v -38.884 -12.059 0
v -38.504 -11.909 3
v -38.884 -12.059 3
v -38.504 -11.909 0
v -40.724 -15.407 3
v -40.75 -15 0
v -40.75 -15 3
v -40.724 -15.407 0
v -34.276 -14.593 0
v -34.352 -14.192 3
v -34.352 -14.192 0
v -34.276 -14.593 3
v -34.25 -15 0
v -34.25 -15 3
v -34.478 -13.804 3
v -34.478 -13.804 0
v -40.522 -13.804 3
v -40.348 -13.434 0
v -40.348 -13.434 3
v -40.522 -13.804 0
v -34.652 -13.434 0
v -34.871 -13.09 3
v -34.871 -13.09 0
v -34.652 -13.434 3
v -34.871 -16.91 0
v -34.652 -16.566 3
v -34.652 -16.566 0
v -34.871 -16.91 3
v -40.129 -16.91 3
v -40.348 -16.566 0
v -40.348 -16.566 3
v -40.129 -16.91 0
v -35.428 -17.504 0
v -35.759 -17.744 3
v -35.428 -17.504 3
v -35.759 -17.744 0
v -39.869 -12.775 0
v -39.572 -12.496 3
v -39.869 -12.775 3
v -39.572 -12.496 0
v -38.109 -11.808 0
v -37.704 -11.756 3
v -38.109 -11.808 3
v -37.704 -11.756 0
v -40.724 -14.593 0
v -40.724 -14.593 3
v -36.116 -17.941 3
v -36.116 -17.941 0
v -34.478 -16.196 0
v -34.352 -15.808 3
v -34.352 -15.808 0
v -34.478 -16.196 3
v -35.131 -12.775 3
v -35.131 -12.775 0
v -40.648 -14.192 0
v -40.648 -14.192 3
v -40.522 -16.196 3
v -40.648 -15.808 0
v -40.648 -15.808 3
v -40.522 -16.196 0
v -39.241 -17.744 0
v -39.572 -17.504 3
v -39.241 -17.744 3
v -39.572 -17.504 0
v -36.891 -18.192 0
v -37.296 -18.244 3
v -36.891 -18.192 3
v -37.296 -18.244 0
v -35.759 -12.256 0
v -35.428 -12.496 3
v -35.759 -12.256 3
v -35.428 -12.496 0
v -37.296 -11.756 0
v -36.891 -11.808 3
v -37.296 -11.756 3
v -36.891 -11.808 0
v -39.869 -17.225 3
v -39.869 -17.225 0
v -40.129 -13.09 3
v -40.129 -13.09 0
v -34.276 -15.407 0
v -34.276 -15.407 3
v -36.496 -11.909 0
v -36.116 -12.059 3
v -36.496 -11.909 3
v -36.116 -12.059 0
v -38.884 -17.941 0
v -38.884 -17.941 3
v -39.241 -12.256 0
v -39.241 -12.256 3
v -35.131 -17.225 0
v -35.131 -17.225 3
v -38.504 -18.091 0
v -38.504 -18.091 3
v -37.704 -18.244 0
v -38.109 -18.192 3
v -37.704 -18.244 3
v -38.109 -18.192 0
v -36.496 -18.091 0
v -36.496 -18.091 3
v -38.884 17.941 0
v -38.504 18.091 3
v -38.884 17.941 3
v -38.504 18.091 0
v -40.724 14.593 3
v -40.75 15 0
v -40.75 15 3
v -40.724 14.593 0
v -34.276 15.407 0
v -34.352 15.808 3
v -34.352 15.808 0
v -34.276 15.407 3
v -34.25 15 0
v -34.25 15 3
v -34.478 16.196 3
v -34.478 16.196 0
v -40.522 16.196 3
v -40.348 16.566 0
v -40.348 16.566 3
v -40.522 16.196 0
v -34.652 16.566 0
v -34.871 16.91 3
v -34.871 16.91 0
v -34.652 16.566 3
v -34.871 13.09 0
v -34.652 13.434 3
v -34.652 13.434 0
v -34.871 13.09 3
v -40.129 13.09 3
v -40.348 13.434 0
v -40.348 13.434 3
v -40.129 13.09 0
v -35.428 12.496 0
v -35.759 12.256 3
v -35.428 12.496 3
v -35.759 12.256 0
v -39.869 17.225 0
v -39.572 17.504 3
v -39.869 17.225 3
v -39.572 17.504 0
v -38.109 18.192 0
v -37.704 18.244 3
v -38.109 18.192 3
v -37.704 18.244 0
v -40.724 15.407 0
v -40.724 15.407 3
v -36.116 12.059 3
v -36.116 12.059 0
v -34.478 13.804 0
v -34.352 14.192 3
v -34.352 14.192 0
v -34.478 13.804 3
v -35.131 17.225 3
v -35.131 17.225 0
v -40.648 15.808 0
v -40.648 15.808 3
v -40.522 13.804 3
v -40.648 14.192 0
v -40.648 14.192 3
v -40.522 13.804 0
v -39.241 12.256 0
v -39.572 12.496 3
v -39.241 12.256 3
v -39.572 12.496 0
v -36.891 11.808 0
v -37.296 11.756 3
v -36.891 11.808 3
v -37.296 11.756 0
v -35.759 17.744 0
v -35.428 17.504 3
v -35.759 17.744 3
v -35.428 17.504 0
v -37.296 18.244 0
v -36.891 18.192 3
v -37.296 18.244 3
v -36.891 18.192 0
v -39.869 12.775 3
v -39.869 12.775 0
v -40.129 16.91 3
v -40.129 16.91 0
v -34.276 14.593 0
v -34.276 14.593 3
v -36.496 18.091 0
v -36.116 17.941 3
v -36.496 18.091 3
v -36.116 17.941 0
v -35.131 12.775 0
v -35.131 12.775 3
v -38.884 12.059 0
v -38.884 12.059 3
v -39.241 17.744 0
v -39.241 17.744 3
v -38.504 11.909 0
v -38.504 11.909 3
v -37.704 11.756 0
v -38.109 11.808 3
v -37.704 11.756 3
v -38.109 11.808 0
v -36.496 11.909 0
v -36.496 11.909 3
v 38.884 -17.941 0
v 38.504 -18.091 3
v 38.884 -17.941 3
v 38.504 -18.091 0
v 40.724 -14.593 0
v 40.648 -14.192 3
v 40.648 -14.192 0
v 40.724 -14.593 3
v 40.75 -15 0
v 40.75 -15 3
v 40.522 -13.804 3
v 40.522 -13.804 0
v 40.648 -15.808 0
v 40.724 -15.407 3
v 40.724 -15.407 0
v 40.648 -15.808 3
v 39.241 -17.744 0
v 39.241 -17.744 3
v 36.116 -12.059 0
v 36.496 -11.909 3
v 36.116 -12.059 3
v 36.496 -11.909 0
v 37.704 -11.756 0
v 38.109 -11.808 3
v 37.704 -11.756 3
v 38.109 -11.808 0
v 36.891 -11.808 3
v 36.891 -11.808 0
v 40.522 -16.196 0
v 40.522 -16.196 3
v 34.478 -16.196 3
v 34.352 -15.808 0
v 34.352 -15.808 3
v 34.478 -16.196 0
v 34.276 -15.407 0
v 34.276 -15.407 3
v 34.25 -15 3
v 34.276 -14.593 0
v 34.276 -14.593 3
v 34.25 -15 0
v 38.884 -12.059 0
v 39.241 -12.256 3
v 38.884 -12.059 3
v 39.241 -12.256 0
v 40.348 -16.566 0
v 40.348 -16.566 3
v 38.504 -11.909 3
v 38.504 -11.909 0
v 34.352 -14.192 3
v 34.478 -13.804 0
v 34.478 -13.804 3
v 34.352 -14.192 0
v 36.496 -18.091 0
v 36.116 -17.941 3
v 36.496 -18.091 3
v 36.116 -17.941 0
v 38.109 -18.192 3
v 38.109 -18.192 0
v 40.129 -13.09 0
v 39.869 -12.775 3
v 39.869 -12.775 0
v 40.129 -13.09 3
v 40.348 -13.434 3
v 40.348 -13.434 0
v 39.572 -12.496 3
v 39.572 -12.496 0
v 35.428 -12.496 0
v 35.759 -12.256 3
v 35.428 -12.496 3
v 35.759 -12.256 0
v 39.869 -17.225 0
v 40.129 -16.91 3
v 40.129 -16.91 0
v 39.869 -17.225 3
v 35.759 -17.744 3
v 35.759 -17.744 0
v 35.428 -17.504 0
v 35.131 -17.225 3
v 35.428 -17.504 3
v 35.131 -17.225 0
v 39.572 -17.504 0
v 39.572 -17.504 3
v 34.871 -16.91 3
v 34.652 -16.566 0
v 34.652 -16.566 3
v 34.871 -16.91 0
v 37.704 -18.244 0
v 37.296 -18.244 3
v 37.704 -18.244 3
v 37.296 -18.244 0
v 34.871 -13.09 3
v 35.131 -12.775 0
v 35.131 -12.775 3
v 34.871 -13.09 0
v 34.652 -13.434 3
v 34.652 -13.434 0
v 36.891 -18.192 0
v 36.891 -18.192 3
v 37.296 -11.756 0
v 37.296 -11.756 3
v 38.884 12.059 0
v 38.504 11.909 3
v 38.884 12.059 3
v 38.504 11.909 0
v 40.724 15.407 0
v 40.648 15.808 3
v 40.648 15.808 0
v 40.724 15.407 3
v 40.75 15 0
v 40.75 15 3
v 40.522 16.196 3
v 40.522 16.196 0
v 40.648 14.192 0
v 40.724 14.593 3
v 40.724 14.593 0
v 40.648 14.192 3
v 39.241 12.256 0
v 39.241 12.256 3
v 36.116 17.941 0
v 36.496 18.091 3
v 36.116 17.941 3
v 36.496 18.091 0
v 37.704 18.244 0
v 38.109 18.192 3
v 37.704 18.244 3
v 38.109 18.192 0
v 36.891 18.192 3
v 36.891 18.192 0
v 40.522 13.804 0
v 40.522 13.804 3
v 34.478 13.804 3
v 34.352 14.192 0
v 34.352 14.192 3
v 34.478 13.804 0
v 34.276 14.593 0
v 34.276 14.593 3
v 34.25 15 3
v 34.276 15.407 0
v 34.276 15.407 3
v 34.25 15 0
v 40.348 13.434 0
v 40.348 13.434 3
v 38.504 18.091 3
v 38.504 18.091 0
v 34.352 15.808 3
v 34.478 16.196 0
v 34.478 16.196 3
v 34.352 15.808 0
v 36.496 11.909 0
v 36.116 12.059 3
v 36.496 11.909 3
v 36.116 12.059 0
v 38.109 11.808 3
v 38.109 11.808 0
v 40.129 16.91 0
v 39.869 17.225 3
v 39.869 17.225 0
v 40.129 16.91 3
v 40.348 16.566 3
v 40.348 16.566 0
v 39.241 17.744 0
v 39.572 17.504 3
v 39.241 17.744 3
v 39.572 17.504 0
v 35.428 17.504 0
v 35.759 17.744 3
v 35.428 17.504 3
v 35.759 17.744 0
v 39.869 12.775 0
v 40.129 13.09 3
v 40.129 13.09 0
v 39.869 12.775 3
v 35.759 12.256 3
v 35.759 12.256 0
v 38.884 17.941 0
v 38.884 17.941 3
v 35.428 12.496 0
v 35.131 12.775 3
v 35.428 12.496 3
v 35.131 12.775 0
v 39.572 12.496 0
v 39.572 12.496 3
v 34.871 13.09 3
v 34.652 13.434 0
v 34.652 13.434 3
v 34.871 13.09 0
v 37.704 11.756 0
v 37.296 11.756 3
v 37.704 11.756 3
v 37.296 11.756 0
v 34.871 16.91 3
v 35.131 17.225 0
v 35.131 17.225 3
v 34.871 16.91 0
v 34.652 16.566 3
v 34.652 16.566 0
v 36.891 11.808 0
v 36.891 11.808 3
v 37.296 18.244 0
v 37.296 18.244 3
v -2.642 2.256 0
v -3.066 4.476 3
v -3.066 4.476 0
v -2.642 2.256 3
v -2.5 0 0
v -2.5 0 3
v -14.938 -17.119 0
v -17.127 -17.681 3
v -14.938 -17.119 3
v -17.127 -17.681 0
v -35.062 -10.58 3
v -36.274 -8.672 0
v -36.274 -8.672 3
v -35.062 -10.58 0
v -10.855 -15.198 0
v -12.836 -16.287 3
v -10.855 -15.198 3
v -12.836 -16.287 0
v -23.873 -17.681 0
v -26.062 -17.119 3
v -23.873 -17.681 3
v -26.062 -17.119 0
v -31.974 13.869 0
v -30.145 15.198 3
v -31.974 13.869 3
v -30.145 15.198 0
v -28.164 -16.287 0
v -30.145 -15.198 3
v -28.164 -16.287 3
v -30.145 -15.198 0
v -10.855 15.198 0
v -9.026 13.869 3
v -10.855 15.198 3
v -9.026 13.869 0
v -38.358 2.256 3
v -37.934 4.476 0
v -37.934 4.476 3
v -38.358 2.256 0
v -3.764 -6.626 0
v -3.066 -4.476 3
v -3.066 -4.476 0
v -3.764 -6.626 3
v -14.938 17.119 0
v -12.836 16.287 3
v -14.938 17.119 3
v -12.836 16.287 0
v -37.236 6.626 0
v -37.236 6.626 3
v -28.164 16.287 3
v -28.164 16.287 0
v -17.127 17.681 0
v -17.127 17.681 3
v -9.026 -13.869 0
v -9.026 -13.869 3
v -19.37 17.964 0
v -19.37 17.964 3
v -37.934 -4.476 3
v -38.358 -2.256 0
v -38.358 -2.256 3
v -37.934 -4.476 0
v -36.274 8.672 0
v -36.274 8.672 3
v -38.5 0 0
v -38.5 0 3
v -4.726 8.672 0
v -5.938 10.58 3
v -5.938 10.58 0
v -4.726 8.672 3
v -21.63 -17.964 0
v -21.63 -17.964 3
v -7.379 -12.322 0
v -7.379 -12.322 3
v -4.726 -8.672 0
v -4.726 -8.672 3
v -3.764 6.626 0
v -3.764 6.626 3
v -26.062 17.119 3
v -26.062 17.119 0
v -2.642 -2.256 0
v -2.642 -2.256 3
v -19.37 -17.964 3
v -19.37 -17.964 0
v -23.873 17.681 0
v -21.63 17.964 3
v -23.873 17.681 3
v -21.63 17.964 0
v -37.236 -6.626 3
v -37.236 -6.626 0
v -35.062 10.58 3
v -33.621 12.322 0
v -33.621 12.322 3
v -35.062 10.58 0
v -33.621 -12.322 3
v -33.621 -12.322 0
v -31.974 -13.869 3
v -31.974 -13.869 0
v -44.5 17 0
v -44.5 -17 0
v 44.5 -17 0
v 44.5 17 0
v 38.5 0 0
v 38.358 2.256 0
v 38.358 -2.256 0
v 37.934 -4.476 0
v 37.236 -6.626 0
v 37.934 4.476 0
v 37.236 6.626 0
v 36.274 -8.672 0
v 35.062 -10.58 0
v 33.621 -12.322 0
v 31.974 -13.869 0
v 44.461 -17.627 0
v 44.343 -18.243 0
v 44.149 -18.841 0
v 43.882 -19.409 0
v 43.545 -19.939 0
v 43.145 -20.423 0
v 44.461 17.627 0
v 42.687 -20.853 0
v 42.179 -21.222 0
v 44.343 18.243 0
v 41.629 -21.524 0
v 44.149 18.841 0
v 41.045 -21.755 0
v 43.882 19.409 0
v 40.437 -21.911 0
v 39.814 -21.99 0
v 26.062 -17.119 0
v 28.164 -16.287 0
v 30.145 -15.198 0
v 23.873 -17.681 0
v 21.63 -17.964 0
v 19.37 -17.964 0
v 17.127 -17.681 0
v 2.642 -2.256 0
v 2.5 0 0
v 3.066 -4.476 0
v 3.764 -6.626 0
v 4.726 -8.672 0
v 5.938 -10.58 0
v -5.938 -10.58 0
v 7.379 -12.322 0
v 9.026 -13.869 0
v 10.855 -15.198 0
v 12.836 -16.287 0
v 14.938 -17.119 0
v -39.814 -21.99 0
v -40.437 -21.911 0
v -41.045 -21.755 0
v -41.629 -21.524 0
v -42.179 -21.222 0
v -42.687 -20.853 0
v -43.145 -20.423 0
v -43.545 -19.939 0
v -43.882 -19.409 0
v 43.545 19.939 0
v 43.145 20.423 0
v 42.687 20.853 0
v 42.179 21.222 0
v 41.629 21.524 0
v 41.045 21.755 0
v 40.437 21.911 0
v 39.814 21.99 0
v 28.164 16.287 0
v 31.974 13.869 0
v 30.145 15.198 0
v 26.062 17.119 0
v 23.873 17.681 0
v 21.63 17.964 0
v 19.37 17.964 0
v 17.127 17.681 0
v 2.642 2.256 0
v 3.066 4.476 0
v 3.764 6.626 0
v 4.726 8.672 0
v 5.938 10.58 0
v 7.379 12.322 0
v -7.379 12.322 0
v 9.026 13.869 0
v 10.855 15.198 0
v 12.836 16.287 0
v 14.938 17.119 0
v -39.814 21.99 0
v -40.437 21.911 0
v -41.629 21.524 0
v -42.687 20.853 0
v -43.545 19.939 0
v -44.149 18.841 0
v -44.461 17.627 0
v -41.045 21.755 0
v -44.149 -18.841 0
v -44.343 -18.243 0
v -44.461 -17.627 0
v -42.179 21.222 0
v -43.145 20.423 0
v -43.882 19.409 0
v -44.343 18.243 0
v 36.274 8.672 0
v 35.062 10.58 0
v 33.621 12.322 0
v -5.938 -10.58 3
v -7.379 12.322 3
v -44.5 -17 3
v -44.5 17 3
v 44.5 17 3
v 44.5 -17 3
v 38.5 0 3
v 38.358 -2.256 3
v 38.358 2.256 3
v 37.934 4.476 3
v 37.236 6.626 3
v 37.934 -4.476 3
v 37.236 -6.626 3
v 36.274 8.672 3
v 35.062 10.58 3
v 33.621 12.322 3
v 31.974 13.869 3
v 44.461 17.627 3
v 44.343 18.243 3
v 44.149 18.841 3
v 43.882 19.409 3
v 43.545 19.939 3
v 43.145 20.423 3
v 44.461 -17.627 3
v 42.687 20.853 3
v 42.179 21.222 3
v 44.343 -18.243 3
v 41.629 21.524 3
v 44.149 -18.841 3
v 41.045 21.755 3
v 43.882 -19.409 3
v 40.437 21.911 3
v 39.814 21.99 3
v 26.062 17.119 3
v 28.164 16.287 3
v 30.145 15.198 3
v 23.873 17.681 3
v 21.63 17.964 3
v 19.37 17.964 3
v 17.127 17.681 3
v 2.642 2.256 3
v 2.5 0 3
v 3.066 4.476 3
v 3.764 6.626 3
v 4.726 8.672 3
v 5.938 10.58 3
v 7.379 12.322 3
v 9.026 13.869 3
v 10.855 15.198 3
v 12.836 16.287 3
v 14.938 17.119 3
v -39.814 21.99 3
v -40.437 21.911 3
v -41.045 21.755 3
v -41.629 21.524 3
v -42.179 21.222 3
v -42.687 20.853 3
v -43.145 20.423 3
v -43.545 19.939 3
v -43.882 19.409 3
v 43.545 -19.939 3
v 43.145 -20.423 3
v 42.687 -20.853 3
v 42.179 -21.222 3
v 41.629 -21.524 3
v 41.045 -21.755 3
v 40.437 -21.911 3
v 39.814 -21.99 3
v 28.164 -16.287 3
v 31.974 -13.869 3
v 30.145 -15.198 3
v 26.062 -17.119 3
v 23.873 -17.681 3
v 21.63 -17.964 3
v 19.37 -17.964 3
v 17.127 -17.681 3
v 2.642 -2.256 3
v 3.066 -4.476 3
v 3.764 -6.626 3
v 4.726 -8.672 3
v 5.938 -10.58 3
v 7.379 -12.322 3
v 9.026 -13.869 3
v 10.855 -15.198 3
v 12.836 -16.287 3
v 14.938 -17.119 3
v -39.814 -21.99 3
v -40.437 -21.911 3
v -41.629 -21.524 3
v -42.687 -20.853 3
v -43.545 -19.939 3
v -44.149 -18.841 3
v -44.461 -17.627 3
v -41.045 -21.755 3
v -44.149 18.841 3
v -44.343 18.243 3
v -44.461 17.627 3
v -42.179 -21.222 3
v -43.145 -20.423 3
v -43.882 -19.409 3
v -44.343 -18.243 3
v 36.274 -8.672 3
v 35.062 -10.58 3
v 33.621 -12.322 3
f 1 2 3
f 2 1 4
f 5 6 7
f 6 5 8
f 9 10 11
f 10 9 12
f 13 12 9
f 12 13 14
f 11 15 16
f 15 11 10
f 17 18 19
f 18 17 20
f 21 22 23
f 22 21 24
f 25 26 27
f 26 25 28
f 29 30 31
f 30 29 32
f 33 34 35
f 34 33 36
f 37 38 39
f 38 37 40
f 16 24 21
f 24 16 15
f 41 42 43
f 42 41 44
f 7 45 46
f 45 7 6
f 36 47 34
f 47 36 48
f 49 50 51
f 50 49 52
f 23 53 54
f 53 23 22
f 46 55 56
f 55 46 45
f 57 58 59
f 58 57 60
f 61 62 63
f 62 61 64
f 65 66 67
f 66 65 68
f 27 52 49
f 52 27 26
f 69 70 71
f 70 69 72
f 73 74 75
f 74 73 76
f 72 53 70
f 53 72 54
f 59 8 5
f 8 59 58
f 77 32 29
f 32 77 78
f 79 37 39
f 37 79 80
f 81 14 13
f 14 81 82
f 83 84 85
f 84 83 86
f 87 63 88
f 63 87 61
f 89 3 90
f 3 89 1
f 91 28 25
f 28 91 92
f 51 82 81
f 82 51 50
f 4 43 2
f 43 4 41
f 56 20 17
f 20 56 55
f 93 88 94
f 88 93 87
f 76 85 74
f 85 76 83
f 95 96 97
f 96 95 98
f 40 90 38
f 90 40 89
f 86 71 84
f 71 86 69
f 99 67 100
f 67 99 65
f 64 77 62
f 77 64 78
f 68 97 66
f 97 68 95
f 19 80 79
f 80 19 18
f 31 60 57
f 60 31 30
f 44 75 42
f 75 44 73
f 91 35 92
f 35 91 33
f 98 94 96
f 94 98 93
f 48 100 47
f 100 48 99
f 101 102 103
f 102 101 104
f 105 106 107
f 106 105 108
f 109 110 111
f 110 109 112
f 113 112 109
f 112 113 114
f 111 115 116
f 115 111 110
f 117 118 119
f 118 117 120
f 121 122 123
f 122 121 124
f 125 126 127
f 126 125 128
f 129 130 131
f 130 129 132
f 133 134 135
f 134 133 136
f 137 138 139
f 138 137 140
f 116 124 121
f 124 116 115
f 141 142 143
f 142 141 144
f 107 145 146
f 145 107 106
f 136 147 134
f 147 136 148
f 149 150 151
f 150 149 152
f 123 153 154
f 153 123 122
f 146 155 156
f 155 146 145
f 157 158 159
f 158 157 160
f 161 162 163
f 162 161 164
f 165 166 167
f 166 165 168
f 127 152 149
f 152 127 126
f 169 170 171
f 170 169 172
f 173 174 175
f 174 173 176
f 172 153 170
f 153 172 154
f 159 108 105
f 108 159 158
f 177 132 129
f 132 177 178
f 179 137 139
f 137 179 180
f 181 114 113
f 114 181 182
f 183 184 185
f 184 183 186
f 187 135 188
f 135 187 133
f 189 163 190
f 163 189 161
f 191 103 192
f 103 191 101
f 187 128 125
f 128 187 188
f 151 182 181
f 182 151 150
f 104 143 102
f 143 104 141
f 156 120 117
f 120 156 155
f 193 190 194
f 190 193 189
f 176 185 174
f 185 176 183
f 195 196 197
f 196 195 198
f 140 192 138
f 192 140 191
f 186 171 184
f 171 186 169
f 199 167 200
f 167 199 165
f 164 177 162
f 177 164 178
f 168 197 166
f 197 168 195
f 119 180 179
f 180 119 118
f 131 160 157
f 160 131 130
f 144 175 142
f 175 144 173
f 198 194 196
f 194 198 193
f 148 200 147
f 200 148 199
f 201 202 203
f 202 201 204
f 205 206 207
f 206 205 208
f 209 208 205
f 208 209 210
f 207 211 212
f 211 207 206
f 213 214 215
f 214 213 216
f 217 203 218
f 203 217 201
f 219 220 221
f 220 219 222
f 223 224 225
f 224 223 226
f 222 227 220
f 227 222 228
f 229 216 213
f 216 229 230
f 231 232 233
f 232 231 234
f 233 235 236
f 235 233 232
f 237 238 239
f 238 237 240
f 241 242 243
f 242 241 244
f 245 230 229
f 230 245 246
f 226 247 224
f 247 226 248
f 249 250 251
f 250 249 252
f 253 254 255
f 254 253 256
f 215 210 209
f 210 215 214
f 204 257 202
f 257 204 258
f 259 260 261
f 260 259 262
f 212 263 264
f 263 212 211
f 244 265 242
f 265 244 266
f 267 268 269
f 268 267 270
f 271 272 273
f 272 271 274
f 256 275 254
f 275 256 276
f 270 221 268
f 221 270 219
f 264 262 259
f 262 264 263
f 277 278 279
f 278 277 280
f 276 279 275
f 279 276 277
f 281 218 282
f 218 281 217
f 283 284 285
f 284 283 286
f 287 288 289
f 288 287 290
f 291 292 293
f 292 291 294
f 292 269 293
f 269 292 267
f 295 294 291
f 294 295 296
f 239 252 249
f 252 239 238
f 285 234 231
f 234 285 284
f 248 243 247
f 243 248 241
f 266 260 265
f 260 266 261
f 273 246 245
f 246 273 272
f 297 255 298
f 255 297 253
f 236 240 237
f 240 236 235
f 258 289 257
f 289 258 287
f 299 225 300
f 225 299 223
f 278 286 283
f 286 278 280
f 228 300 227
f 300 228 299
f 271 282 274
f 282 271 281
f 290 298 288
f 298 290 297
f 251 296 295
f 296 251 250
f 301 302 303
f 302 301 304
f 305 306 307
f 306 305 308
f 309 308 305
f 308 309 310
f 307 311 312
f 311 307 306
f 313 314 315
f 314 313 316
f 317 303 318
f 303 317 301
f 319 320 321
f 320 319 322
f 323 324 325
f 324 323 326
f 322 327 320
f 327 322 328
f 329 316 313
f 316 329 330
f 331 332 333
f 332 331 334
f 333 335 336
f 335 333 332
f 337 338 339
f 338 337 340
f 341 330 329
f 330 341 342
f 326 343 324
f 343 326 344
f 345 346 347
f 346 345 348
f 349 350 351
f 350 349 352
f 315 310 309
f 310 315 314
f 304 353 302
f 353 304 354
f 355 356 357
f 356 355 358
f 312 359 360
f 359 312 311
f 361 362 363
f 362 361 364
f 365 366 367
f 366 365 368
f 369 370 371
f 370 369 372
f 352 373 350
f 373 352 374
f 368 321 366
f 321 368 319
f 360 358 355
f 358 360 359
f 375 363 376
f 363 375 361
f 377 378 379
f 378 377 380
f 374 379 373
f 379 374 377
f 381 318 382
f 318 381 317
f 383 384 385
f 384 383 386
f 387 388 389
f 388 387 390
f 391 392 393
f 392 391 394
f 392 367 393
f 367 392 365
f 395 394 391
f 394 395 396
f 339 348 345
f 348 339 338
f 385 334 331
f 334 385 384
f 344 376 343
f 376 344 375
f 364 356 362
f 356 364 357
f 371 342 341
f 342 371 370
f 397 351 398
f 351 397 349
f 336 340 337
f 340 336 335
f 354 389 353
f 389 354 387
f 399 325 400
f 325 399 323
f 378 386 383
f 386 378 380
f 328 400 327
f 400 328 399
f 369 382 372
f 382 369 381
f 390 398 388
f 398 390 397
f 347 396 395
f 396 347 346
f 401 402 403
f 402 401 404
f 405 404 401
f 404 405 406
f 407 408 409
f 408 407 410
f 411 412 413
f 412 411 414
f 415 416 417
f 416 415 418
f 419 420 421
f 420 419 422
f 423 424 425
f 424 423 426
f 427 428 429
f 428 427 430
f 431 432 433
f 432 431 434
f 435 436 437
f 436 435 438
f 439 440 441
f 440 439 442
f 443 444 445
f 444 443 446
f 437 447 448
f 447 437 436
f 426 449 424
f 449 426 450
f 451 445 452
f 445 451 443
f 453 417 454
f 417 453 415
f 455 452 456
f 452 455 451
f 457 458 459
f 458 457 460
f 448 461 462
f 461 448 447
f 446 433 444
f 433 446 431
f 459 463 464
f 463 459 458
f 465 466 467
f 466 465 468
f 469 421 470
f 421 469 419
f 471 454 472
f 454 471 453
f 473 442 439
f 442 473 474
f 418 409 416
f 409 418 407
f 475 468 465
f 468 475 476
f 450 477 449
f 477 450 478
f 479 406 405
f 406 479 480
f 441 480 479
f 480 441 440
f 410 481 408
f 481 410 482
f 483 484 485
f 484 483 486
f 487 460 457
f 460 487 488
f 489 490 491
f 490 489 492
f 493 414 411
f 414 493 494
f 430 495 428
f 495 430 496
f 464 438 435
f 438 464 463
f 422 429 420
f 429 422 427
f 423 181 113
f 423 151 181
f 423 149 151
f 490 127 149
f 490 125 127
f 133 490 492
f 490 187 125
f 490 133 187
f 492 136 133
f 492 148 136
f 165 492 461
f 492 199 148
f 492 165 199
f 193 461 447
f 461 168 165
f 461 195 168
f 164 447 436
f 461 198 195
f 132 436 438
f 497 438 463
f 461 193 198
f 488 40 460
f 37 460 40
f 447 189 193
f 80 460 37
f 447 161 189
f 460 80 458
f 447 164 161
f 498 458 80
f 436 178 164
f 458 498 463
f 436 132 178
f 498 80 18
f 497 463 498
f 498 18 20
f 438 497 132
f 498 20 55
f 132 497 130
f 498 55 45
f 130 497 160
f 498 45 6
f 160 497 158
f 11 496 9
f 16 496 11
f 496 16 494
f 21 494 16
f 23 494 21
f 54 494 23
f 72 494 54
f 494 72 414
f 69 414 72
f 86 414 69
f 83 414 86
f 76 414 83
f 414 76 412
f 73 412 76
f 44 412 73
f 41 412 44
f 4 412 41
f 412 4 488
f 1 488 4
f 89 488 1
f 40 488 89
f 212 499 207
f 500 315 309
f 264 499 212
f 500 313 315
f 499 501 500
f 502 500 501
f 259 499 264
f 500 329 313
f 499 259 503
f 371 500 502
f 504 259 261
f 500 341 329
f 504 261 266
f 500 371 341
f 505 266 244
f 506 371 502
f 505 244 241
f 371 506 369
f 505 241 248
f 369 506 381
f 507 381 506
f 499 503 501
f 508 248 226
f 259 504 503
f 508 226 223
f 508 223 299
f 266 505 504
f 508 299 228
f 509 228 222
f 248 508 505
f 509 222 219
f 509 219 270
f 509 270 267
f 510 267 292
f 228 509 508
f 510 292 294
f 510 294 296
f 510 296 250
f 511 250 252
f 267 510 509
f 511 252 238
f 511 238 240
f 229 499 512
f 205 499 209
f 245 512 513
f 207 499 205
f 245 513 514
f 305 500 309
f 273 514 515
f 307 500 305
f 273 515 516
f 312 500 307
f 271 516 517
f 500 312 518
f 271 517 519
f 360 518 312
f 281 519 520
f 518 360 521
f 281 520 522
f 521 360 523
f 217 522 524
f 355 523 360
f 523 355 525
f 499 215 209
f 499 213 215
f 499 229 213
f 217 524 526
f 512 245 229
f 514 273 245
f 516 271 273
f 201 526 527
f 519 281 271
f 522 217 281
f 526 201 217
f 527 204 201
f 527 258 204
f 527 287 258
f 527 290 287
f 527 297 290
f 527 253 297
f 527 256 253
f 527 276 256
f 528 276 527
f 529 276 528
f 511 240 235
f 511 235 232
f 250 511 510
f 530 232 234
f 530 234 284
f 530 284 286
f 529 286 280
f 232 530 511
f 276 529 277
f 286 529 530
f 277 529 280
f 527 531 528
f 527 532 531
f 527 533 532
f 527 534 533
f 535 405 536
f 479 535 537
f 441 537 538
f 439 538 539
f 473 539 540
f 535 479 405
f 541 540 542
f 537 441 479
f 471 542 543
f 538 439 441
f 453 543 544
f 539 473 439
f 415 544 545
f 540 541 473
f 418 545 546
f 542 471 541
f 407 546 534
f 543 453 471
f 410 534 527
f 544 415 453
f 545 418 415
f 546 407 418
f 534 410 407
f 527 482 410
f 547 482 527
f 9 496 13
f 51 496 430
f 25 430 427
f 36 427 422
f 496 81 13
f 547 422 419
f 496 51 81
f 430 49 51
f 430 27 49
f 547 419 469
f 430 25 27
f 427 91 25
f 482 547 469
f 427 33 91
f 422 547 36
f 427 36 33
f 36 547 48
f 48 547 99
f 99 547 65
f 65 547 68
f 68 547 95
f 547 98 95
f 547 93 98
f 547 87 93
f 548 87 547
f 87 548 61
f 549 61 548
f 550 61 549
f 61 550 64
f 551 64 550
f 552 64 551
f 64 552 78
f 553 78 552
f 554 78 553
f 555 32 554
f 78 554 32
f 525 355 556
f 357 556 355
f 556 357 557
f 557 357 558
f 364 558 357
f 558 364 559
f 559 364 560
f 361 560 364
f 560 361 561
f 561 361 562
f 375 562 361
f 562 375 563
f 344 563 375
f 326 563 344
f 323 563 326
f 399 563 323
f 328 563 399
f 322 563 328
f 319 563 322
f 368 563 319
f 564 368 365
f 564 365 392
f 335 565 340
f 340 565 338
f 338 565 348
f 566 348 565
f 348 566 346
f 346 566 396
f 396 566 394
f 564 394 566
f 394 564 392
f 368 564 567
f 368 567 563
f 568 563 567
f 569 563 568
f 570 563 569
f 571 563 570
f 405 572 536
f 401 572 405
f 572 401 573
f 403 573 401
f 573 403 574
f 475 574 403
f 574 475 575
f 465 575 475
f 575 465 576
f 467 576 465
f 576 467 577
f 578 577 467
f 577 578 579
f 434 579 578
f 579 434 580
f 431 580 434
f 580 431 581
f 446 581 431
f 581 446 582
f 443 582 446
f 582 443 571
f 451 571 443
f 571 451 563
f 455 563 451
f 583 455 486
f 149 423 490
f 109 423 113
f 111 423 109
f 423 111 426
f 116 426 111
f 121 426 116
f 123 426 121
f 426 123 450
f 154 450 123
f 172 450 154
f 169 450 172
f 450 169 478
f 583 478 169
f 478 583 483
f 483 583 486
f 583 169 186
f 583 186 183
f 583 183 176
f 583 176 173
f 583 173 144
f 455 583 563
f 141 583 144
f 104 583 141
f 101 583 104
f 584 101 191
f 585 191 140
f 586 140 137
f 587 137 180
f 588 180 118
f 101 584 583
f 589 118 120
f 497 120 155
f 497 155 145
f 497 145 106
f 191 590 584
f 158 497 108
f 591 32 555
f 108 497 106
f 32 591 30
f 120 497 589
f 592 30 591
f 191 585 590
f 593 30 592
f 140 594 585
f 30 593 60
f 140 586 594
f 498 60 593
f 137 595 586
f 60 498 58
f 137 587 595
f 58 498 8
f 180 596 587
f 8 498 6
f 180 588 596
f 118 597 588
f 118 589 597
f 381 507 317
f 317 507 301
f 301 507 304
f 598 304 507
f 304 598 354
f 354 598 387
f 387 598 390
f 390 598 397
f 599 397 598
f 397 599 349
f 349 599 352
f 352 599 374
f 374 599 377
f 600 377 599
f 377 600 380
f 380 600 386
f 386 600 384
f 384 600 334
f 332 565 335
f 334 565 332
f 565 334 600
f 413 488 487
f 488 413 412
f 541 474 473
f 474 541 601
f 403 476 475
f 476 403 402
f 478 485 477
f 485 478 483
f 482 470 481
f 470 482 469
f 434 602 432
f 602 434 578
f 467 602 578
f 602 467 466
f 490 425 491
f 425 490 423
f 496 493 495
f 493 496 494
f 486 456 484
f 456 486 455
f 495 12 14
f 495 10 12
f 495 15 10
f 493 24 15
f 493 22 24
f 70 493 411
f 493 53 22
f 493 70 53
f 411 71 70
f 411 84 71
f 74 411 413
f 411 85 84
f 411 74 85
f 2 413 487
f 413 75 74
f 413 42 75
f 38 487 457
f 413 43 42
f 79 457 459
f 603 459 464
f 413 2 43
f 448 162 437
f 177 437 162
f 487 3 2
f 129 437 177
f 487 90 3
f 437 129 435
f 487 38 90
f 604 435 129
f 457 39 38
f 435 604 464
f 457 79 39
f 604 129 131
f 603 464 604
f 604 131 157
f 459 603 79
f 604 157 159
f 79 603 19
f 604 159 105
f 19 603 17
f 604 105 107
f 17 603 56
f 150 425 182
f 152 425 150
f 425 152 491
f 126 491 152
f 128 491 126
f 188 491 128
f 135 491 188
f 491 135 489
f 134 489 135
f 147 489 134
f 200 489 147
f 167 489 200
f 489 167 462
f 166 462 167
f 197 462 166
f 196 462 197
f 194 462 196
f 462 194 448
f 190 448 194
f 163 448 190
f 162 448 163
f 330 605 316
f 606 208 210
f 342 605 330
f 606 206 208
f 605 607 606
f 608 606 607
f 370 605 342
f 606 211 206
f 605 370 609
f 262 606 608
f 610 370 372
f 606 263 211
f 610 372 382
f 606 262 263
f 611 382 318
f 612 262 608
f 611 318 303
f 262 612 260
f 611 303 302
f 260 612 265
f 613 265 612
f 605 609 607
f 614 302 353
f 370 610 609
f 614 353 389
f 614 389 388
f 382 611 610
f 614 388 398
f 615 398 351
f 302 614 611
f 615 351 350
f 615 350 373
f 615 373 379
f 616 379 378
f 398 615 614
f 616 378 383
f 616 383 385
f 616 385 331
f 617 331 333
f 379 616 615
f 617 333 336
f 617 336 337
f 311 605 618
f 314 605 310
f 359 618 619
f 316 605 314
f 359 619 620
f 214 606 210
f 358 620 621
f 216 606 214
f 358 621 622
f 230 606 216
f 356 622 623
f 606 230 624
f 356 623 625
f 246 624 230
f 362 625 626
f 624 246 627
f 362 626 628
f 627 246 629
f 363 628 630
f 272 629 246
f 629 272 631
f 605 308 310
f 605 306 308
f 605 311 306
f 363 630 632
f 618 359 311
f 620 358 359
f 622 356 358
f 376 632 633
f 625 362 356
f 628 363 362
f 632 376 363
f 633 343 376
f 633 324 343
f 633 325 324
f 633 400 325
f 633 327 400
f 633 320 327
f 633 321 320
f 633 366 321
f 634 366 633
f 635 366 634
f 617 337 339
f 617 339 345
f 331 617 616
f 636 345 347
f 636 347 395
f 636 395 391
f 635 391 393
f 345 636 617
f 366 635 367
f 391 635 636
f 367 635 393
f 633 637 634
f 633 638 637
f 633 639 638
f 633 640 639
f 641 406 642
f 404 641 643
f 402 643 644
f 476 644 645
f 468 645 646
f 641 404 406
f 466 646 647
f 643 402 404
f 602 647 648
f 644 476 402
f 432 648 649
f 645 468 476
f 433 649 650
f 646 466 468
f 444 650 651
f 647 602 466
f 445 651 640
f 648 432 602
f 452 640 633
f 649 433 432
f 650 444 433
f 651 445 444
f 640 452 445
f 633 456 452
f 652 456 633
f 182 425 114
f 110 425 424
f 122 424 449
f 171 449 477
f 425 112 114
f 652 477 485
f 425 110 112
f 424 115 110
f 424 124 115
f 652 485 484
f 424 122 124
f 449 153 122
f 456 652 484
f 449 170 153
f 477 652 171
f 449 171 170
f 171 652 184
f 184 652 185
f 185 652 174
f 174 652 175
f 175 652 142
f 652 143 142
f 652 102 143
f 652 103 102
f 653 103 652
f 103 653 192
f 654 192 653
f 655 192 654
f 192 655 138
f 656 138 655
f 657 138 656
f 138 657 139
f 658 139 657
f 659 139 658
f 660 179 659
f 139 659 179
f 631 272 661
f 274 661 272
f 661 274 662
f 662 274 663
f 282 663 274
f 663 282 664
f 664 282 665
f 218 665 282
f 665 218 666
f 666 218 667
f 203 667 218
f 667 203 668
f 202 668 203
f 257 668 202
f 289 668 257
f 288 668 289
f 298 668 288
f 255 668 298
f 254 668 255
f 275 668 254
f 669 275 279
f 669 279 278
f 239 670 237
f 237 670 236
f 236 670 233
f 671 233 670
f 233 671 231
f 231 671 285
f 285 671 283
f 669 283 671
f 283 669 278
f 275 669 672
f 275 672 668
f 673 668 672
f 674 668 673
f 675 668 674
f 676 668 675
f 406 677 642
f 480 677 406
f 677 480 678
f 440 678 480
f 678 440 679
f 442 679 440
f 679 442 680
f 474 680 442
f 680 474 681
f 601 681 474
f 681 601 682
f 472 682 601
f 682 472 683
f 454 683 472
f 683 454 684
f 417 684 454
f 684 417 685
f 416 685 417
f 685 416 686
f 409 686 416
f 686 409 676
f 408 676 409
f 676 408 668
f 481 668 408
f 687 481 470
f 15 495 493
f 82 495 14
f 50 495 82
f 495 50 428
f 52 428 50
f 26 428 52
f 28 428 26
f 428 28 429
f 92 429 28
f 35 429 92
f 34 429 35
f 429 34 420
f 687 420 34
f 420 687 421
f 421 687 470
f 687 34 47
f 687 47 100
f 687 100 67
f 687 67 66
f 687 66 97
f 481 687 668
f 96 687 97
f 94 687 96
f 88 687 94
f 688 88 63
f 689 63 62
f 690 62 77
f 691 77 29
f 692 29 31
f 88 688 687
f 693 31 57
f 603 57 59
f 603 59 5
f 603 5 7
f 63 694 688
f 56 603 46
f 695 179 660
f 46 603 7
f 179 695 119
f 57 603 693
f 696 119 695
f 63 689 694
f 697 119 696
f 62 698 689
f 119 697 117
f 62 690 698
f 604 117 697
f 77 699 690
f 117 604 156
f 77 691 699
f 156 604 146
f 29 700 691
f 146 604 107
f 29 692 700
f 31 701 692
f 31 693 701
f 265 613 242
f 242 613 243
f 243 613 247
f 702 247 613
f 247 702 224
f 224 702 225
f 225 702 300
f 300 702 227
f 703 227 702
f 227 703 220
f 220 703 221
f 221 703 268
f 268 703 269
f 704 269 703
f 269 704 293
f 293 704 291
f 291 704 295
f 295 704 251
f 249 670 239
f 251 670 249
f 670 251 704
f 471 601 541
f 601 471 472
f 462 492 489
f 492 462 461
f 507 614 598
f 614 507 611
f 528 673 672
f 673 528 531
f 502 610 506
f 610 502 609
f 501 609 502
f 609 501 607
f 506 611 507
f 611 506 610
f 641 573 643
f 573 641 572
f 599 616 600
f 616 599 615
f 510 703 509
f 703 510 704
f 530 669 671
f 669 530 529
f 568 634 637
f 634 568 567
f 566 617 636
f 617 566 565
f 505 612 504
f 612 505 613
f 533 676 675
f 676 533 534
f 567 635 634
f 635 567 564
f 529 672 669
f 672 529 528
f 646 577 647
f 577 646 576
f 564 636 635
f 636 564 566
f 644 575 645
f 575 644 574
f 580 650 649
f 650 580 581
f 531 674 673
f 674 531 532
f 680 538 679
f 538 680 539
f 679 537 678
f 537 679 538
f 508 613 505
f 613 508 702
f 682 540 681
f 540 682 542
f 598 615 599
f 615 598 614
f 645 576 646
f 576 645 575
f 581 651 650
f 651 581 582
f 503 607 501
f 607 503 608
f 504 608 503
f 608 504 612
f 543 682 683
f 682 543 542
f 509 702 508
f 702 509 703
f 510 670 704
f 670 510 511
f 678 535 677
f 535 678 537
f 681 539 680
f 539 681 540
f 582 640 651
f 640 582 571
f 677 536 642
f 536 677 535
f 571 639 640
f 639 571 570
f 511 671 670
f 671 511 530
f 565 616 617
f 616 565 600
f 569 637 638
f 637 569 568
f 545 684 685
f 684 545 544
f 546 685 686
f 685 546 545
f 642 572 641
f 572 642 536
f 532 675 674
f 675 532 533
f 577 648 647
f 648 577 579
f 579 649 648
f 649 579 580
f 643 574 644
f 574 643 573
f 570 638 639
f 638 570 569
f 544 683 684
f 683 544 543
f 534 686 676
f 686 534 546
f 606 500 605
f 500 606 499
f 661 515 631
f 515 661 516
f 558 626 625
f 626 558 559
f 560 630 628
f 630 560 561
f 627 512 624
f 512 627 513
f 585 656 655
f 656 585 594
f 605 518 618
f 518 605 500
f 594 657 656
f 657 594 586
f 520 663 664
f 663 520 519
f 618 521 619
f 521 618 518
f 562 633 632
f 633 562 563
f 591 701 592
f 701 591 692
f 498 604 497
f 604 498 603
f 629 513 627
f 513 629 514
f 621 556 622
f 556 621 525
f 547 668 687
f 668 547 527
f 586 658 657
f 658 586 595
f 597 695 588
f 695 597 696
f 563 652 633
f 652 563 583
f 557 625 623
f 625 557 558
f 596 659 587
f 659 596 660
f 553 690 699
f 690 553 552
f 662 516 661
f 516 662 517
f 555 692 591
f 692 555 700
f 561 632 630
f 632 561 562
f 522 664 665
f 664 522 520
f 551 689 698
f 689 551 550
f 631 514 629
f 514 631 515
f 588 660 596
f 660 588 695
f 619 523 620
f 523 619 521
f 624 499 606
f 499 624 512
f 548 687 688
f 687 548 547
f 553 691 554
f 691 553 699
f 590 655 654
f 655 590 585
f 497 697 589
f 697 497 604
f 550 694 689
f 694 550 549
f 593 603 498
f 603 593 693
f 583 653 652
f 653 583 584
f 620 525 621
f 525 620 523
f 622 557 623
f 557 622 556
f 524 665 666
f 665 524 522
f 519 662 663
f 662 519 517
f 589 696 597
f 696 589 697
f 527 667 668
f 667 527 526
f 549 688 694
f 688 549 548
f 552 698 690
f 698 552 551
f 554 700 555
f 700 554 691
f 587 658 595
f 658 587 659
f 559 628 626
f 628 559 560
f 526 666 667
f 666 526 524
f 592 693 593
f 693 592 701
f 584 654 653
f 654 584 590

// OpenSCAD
$fn = 50;

difference() {
	union() {
		hull() {
			translate(v = [-39.5, 17.0, 0]) {
				cylinder(h = 3, r = 5);
			}
			translate(v = [39.5, 17.0, 0]) {
				cylinder(h = 3, r = 5);
			}
			translate(v = [-39.5, -17.0, 0]) {
				cylinder(h = 3, r = 5);
			}
			translate(v = [39.5, -17.0, 0]) {
				cylinder(h = 3, r = 5);
			}
		}
	}
	union() {
		translate(v = [-37.5, -15.0, -100.0]) {
			cylinder(h = 200, r = 3.25);
		}
		translate(v = [-37.5, 15.0, -100.0]) {
			cylinder(h = 200, r = 3.25);
		}
		translate(v = [37.5, -15.0, -100.0]) {
			cylinder(h = 200, r = 3.25);
		}
		translate(v = [37.5, 15.0, -100.0]) {
			cylinder(h = 200, r = 3.25);
		}
		translate(v = [-37.5, -15.0, -100.0]) {
			cylinder(h = 200, r = 1.8);
		}
		translate(v = [-37.5, 15.0, -100.0]) {
			cylinder(h = 200, r = 1.8);
		}
		translate(v = [37.5, -15.0, -100.0]) {
			cylinder(h = 200, r = 1.8);
		}
		translate(v = [37.5, 15.0, -100.0]) {
			cylinder(h = 200, r = 1.8);
		}
		translate(v = [-20.5, 0, 0.0]) {
			cylinder(h = 3, r = 18.0);
		}
		translate(v = [20.5, 0, 0.0]) {
			cylinder(h = 3, r = 18.0);
		}
	}
}
